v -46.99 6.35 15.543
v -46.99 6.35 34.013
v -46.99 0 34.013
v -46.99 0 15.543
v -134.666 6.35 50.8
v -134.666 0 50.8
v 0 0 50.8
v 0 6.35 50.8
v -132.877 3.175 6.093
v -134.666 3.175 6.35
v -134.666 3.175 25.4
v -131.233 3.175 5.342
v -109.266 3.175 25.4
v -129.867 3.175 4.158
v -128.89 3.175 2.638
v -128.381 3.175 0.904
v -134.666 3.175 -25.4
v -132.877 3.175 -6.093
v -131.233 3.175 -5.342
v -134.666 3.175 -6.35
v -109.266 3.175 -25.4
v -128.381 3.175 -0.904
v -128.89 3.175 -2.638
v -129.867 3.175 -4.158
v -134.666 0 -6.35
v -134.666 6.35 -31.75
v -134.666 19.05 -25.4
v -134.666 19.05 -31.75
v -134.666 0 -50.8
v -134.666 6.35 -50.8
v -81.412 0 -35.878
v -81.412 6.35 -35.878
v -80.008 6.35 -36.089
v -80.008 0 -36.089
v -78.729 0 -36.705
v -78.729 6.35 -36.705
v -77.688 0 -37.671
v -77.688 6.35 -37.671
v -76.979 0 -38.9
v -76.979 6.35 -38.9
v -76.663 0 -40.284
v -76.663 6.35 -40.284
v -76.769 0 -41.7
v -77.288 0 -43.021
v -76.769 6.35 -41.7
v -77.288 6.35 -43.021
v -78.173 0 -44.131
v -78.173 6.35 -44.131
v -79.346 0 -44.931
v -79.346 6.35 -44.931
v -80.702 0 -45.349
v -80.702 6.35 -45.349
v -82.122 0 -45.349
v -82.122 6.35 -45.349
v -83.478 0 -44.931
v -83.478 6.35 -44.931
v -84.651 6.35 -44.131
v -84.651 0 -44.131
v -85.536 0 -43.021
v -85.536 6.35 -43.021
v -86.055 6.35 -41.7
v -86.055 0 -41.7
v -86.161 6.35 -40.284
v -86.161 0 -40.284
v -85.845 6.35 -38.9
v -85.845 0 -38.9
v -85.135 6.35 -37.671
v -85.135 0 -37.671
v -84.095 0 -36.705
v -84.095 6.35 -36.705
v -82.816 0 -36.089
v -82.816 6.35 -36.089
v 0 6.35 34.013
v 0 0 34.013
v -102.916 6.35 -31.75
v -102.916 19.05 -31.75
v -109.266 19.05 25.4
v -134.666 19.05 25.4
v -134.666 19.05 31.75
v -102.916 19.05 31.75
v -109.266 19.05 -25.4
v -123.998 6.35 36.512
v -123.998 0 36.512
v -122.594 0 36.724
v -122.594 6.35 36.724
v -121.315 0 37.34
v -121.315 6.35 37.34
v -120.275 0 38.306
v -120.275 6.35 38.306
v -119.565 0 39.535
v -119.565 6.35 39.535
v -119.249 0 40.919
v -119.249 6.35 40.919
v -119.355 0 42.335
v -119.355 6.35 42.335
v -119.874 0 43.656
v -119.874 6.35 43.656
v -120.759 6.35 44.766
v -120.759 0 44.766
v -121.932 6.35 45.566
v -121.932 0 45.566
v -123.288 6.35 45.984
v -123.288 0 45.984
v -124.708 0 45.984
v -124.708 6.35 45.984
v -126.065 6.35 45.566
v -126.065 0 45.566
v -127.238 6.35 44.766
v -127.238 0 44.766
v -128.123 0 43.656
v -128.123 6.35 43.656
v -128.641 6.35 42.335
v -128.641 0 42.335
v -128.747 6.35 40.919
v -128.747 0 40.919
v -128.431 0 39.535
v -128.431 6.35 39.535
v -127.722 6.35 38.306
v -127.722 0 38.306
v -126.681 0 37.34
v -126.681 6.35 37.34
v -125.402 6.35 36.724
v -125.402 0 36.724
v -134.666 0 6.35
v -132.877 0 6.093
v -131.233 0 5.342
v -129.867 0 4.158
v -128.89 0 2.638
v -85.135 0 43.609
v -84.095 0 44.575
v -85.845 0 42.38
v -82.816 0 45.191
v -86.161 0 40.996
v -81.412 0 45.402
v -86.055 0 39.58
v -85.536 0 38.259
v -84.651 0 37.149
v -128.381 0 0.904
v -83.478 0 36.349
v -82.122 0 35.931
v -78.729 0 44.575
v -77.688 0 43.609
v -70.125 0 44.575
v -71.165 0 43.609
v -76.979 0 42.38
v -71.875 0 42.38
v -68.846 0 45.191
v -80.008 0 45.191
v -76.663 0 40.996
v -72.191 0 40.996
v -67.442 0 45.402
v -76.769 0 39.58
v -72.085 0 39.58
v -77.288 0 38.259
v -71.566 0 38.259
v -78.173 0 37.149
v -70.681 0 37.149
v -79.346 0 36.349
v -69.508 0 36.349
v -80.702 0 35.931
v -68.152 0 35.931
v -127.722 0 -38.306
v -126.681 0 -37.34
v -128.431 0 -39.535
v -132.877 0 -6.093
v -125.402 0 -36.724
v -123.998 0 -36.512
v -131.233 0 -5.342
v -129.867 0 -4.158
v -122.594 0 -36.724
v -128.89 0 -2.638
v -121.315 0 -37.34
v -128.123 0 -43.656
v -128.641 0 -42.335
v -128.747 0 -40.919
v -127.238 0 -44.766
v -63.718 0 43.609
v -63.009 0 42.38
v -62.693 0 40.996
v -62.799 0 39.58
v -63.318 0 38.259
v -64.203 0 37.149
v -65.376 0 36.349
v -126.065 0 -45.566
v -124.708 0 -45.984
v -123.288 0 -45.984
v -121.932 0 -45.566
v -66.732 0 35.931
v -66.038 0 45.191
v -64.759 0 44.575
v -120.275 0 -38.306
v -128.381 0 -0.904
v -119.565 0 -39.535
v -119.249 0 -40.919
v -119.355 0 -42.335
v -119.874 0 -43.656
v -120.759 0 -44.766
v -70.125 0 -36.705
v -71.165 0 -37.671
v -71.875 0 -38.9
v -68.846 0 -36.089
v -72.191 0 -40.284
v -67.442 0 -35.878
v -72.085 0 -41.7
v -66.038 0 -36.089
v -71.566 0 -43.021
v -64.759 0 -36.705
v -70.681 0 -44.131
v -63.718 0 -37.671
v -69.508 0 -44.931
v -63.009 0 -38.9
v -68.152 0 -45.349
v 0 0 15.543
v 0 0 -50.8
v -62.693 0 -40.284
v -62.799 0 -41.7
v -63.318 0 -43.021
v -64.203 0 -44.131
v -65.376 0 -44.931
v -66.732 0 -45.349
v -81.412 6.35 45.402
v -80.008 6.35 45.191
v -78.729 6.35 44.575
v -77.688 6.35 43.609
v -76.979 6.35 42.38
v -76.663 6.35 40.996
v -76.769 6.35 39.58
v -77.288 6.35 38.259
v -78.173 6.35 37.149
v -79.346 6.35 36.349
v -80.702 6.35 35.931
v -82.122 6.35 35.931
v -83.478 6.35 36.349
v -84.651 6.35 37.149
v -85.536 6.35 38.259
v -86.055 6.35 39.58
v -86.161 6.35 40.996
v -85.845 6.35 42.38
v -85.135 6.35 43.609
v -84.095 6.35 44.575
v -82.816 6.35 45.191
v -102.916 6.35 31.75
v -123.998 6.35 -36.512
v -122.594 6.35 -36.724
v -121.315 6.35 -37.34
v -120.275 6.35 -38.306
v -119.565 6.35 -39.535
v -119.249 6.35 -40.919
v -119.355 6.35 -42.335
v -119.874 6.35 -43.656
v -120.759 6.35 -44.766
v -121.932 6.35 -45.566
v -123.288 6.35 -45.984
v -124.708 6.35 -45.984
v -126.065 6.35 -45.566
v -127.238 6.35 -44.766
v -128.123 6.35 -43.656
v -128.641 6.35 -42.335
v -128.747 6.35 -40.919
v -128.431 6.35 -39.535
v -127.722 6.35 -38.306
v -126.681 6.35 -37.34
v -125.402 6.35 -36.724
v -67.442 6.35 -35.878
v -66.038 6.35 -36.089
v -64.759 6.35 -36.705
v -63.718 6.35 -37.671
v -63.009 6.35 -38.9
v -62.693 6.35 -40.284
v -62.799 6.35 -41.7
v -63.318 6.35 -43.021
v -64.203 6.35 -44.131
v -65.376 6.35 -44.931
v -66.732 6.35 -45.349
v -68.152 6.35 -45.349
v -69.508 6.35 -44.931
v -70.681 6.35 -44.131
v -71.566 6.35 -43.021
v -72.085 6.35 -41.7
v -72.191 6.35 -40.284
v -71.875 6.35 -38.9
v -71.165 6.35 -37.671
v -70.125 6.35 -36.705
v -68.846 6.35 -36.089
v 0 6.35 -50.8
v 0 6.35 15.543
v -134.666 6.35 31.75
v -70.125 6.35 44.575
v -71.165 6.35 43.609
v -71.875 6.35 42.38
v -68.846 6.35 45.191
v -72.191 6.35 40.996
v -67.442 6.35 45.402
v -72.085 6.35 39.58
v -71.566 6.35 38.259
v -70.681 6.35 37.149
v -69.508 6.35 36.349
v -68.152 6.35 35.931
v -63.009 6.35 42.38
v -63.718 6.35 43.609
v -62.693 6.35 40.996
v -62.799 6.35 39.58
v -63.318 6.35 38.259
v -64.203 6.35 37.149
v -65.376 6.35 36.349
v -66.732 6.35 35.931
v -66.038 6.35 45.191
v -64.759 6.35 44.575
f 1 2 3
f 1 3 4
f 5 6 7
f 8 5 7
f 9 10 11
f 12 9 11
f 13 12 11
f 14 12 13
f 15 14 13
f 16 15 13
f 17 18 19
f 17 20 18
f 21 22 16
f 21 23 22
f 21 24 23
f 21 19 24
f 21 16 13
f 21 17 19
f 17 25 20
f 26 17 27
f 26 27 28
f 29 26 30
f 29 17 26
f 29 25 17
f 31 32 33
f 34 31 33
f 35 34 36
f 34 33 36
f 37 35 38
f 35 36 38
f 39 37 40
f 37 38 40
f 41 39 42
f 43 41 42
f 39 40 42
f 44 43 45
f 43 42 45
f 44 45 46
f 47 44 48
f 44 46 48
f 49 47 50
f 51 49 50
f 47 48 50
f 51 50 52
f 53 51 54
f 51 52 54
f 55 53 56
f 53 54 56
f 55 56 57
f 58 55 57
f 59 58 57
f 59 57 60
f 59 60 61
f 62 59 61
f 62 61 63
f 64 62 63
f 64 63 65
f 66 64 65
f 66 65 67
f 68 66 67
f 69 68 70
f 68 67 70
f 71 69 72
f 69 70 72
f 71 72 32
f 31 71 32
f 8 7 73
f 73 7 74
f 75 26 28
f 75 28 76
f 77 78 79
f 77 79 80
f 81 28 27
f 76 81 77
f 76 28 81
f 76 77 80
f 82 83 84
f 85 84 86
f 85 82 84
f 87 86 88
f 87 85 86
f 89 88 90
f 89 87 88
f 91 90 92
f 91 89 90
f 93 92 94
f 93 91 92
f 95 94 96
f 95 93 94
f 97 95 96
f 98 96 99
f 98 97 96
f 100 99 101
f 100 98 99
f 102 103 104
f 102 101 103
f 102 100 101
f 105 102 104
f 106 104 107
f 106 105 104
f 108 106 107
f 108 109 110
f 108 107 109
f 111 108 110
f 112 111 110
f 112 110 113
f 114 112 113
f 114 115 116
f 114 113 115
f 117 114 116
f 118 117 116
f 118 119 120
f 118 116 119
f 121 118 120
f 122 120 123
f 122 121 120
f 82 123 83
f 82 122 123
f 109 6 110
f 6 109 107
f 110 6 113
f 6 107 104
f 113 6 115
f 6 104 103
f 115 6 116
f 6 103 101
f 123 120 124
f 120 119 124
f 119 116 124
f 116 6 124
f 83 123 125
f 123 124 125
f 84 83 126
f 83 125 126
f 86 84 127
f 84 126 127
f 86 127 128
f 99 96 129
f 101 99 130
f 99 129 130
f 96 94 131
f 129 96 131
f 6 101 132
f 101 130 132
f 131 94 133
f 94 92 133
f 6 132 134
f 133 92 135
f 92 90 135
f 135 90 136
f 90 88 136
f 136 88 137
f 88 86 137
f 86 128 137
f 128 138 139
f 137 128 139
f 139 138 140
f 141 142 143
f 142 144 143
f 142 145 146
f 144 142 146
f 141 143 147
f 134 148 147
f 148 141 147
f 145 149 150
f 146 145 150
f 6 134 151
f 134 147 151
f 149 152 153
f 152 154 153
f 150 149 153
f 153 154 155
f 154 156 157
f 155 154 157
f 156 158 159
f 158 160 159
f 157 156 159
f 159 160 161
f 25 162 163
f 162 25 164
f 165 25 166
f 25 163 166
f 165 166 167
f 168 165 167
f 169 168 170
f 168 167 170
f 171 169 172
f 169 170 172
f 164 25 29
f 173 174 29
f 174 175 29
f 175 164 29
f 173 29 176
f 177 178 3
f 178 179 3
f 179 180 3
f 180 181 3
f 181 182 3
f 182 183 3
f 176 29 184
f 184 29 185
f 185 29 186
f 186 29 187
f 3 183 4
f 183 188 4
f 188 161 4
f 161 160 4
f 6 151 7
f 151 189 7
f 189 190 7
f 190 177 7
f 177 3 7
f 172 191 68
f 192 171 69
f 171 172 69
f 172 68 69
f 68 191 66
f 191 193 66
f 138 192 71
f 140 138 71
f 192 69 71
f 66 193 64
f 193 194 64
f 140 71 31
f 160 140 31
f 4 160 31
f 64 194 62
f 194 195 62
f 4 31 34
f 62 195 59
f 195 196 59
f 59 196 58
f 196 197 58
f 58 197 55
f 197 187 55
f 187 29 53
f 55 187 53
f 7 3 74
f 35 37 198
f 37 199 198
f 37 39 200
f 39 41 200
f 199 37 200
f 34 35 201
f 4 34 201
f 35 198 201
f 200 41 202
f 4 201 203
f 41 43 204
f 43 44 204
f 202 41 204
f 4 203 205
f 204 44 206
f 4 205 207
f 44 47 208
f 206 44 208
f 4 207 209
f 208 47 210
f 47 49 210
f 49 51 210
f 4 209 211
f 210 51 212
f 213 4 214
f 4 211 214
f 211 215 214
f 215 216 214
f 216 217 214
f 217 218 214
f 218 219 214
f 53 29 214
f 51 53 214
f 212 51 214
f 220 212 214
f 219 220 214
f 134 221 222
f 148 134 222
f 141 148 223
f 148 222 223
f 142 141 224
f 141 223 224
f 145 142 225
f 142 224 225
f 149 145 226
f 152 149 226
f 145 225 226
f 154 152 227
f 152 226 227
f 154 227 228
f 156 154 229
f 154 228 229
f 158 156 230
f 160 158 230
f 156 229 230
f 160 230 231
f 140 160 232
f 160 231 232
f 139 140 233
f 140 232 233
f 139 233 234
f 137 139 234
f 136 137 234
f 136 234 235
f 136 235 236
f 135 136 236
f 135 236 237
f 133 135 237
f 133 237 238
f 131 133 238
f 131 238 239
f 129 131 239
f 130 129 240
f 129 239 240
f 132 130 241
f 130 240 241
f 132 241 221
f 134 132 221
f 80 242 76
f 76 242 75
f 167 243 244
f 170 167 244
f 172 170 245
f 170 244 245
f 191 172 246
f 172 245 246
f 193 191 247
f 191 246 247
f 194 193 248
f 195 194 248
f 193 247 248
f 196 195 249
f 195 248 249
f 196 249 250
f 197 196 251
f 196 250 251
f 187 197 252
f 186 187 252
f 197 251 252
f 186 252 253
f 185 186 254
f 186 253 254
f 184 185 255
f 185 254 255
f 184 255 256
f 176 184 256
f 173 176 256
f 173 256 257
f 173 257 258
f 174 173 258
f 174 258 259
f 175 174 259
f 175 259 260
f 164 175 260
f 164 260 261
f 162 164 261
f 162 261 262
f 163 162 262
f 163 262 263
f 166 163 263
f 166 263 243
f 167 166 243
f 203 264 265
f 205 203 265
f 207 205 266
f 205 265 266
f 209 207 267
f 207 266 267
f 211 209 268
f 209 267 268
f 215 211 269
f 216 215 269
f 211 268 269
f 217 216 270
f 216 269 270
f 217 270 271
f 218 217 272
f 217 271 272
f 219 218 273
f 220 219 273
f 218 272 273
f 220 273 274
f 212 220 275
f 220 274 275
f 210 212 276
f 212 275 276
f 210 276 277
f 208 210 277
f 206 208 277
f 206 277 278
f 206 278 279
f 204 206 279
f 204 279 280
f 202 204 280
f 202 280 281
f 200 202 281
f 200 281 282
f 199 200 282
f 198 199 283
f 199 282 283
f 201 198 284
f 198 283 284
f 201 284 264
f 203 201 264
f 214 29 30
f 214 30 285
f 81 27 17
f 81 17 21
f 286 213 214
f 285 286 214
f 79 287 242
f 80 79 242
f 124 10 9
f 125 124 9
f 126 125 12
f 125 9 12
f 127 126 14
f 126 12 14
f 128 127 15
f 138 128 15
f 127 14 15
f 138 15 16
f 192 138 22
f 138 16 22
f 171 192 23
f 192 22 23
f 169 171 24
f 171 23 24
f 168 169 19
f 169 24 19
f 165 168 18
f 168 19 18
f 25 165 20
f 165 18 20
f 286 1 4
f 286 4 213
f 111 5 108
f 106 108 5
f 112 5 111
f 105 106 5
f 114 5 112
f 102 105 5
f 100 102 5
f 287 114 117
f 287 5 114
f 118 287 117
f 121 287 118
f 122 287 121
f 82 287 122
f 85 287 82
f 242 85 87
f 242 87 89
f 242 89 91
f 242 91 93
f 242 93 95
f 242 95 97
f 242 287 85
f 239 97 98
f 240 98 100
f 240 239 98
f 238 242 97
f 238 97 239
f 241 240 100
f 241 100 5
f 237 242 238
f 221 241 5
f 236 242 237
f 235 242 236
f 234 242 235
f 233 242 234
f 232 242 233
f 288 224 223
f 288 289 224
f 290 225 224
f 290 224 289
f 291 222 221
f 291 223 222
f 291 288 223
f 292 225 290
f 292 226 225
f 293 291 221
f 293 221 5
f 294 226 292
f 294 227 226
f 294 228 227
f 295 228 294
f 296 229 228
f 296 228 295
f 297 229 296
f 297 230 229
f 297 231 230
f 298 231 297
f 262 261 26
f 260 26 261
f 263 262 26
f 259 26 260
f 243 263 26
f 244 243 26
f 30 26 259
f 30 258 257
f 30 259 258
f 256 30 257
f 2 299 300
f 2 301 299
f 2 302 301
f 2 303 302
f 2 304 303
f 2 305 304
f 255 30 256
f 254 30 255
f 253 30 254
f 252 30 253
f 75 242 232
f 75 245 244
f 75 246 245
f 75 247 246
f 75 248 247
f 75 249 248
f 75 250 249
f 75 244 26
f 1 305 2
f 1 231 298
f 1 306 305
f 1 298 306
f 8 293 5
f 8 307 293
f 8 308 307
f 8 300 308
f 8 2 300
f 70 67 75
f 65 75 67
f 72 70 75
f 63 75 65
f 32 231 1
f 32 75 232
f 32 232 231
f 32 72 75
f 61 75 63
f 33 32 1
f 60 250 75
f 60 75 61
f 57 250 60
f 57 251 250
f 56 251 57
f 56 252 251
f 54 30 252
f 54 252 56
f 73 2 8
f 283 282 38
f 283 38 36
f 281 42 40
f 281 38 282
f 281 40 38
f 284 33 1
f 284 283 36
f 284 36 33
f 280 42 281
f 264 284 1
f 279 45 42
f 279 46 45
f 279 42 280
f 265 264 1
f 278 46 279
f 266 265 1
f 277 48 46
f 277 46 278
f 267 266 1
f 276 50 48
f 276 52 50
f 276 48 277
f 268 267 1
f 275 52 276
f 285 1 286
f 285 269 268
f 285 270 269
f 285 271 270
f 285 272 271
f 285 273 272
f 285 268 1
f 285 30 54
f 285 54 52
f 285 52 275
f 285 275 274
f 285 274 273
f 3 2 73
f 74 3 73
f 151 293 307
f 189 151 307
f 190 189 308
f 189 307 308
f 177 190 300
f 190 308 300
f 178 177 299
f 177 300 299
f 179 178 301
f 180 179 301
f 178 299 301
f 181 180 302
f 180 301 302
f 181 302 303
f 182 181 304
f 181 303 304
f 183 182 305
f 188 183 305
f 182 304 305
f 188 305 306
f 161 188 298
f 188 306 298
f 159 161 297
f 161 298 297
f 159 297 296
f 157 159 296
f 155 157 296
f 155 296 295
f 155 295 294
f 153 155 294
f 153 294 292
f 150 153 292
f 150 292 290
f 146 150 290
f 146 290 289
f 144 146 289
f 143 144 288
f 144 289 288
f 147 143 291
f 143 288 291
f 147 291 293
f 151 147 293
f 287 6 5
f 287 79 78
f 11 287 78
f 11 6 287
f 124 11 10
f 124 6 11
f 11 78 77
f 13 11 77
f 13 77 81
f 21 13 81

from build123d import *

# Parameters (mm, degrees)
SKETCH1_W                = 279.4
SKETCH1_H                = 101.6
BOSS_EXTRUDE1_DEPTH      = 6.35
SKETCH2_R                = 13.97
BOSS_EXTRUDE3_DEPTH      = 5.55625
SKETCH9_R                = 11.1125
CUT_EXTRUDE4_DEPTH       = 4.445
CUT_EXTRUDE5_START       = -5.55625
SKETCH10_R               = 11.1125
CUT_EXTRUDE5_DEPTH       = 5.55625
SKETCH11_R               = 7.9375
CUT_EXTRUDE6_DEPTH       = 285.078633923
SKETCH12_R               = 6.35
CUT_EXTRUDE7_DEPTH       = 285.051619429
SKETCH22_W               = 63.5
SKETCH22_H               = 63.5
BOSS_EXTRUDE7_DEPTH      = 12.7
SKETCH25_W               = 50.8
SKETCH25_H               = 50.8
CUT_EXTRUDE11_DEPTH      = 15.875
SKETCH32_R               = 4.7625
CUT_EXTRUDE12_DEPTH      = 6.35
SKETCH38_W               = 46.99
SKETCH38_H               = 18.470251096
CUT_EXTRUDE13_DEPTH      = 6.35
SKETCH60_R               = 4.7625
CUT_EXTRUDE23_DEPTH      = 6.35
CUT_EXTRUDE26_DEPTH      = 285.264471927
CUT_EXTRUDE26_DEPTH_BACK = 285.264471927
SKETCH63_R               = 4.7625
CUT_EXTRUDE27_DEPTH      = 145.488464724


with BuildPart() as part:
    # Sketch1 → Boss-Extrude1 (new body)
    with BuildSketch(Plane(origin=(0, 0, 0), x_dir=(1, 0, 0), z_dir=(0, 1, 0))):
        with Locations((-139.7, 0)):
            Rectangle(SKETCH1_W, SKETCH1_H)
    extrude(amount=BOSS_EXTRUDE1_DEPTH)

    # Sketch2 → Boss-Extrude3 (add)
    with BuildSketch(Plane(origin=(0, 6.35, 0), x_dir=(1, 0, 0), z_dir=(0, 1, 0))):
        with Locations(Location((-258.510557857, 0, 0), (0, 0, 90))):
            Circle(SKETCH2_R)
    extrude(amount=BOSS_EXTRUDE3_DEPTH)

    # Sketch9 → Cut-Extrude4 (cut)
    with BuildSketch(Plane(origin=(0, 11.90625, 0), x_dir=(1, 0, 0), z_dir=(0, 1, 0))):
        with Locations(Location((-258.510557857, 0, 0), (0, 0, 270))):
            Circle(SKETCH9_R)
    extrude(amount=-CUT_EXTRUDE4_DEPTH, mode=Mode.SUBTRACT)

    # Sketch10 → Cut-Extrude5 (cut)
    with BuildSketch(Plane(origin=(0, 0, 0), x_dir=(-1, 0, 0), z_dir=(0, -1, 0)).offset(CUT_EXTRUDE5_START)):
        with Locations(Location((258.510557857, 0, 0), (0, 0, 270))):
            Circle(SKETCH10_R)
    extrude(amount=CUT_EXTRUDE5_DEPTH, mode=Mode.SUBTRACT)

    # Sketch11 → Cut-Extrude6 (cut, through all)
    with BuildSketch(Plane(origin=(0, 7.46125, 0), x_dir=(1, 0, 0), z_dir=(0, 1, 0))):
        with Locations(Location((-258.510557857, 0, 0), (0, 0, 270))):
            Circle(SKETCH11_R)
    extrude(amount=-CUT_EXTRUDE6_DEPTH, mode=Mode.SUBTRACT)

    # Sketch12 → Cut-Extrude7 (cut, through all)
    with BuildSketch(Plane(origin=(0, 6.35, 0), x_dir=(1, 0, 0), z_dir=(0, 1, 0))):
        with Locations(Location((-134.666203771, 0, 0), (0, 0, 270))):
            Circle(SKETCH12_R)
    extrude(amount=-CUT_EXTRUDE7_DEPTH, mode=Mode.SUBTRACT)

    # Sketch22 → Boss-Extrude7 (add)
    with BuildSketch(Plane(origin=(0, 6.35, 0), x_dir=(1, 0, 0), z_dir=(0, 1, 0))):
        with Locations((-134.666203771, 0)):
            Rectangle(SKETCH22_W, SKETCH22_H)
    extrude(amount=BOSS_EXTRUDE7_DEPTH)

    # Sketch25 → Cut-Extrude11 (cut)
    with BuildSketch(Plane(origin=(0, 19.05, 0), x_dir=(1, 0, 0), z_dir=(0, 1, 0))):
        with Locations((-134.666203771, 0)):
            Rectangle(SKETCH25_W, SKETCH25_H)
    extrude(amount=-CUT_EXTRUDE11_DEPTH, mode=Mode.SUBTRACT)

    # Sketch32 → Cut-Extrude12 (cut)
    with BuildSketch(Plane(origin=(0, 6.35, 0), x_dir=(1, 0, 0), z_dir=(0, 1, 0))):
        with Locations(Location((-67.44195898, -40.64, 0), (0, 0, 270))):
            Circle(SKETCH32_R)
        with Locations(Location((-81.41195898, -40.64, 0), (0, 0, 270))):
            Circle(SKETCH32_R)
        with Locations(Location((-67.44195898, 40.64, 0), (0, 0, 270))):
            Circle(SKETCH32_R)
        with Locations(Location((-81.41195898, 40.64, 0), (0, 0, 270))):
            Circle(SKETCH32_R)
    extrude(amount=-CUT_EXTRUDE12_DEPTH, mode=Mode.SUBTRACT)

    # Sketch38 → Cut-Extrude13 (cut)
    with BuildSketch(Plane(origin=(0, 6.35, 0), x_dir=(1, 0, 0), z_dir=(0, 1, 0))):
        with Locations((-23.495, -24.777709652)):
            Rectangle(SKETCH38_W, SKETCH38_H)
    extrude(amount=-CUT_EXTRUDE13_DEPTH, mode=Mode.SUBTRACT)

    # Sketch60 → Cut-Extrude23 (cut)
    with BuildSketch(Plane(origin=(0, 6.35, 0), x_dir=(1, 0, 0), z_dir=(0, 1, 0))):
        with Locations(Location((-231.7492444, 41.324145444, 0), (0, 0, 270))):
            Circle(SKETCH60_R)
        with Locations(Location((-231.7492444, -39.369341378, 0), (0, 0, 270))):
            Circle(SKETCH60_R)
        with Locations(Location((-173.509244294, -39.369341378, 0), (0, 0, 270))):
            Circle(SKETCH60_R)
        with Locations(Location((-173.509244294, 41.324145444, 0), (0, 0, 270))):
            Circle(SKETCH60_R)
    extrude(amount=-CUT_EXTRUDE23_DEPTH, mode=Mode.SUBTRACT)

    # Sketch62 → Cut-Extrude26 (cut, two sides: drawn at the far end of the back side and taken through both)
    with BuildSketch(Plane(origin=(0, 6.35, 0), x_dir=(1, 0, 0), z_dir=(0, 1, 0)).offset(-CUT_EXTRUDE26_DEPTH_BACK)):
        Polygon((-134.666203771, -414.468951257), (-134.666203771, -50.8), (-134.666203771, 0), (-134.666203771, 50.8), (-134.666203771, 414.468951257), (-862.004106285, 414.468951257), (-862.004106285, -414.468951257), align=None)
    extrude(amount=CUT_EXTRUDE26_DEPTH + CUT_EXTRUDE26_DEPTH_BACK, mode=Mode.SUBTRACT)

    # Sketch63 → Cut-Extrude27 (cut, through all)
    with BuildSketch(Plane(origin=(0, 6.35, 0), x_dir=(1, 0, 0), z_dir=(0, 1, 0))):
        with Locations(Location((-123.998203771, 41.275, 0), (0, 0, 270))):
            Circle(SKETCH63_R)
    cut_extrude27 = extrude(amount=-CUT_EXTRUDE27_DEPTH, mode=Mode.SUBTRACT)

    # Mirror1: Cut-Extrude27 across plane
    add(cut_extrude27.mirror(Plane.XY), mode=Mode.SUBTRACT)


solid = part.part
